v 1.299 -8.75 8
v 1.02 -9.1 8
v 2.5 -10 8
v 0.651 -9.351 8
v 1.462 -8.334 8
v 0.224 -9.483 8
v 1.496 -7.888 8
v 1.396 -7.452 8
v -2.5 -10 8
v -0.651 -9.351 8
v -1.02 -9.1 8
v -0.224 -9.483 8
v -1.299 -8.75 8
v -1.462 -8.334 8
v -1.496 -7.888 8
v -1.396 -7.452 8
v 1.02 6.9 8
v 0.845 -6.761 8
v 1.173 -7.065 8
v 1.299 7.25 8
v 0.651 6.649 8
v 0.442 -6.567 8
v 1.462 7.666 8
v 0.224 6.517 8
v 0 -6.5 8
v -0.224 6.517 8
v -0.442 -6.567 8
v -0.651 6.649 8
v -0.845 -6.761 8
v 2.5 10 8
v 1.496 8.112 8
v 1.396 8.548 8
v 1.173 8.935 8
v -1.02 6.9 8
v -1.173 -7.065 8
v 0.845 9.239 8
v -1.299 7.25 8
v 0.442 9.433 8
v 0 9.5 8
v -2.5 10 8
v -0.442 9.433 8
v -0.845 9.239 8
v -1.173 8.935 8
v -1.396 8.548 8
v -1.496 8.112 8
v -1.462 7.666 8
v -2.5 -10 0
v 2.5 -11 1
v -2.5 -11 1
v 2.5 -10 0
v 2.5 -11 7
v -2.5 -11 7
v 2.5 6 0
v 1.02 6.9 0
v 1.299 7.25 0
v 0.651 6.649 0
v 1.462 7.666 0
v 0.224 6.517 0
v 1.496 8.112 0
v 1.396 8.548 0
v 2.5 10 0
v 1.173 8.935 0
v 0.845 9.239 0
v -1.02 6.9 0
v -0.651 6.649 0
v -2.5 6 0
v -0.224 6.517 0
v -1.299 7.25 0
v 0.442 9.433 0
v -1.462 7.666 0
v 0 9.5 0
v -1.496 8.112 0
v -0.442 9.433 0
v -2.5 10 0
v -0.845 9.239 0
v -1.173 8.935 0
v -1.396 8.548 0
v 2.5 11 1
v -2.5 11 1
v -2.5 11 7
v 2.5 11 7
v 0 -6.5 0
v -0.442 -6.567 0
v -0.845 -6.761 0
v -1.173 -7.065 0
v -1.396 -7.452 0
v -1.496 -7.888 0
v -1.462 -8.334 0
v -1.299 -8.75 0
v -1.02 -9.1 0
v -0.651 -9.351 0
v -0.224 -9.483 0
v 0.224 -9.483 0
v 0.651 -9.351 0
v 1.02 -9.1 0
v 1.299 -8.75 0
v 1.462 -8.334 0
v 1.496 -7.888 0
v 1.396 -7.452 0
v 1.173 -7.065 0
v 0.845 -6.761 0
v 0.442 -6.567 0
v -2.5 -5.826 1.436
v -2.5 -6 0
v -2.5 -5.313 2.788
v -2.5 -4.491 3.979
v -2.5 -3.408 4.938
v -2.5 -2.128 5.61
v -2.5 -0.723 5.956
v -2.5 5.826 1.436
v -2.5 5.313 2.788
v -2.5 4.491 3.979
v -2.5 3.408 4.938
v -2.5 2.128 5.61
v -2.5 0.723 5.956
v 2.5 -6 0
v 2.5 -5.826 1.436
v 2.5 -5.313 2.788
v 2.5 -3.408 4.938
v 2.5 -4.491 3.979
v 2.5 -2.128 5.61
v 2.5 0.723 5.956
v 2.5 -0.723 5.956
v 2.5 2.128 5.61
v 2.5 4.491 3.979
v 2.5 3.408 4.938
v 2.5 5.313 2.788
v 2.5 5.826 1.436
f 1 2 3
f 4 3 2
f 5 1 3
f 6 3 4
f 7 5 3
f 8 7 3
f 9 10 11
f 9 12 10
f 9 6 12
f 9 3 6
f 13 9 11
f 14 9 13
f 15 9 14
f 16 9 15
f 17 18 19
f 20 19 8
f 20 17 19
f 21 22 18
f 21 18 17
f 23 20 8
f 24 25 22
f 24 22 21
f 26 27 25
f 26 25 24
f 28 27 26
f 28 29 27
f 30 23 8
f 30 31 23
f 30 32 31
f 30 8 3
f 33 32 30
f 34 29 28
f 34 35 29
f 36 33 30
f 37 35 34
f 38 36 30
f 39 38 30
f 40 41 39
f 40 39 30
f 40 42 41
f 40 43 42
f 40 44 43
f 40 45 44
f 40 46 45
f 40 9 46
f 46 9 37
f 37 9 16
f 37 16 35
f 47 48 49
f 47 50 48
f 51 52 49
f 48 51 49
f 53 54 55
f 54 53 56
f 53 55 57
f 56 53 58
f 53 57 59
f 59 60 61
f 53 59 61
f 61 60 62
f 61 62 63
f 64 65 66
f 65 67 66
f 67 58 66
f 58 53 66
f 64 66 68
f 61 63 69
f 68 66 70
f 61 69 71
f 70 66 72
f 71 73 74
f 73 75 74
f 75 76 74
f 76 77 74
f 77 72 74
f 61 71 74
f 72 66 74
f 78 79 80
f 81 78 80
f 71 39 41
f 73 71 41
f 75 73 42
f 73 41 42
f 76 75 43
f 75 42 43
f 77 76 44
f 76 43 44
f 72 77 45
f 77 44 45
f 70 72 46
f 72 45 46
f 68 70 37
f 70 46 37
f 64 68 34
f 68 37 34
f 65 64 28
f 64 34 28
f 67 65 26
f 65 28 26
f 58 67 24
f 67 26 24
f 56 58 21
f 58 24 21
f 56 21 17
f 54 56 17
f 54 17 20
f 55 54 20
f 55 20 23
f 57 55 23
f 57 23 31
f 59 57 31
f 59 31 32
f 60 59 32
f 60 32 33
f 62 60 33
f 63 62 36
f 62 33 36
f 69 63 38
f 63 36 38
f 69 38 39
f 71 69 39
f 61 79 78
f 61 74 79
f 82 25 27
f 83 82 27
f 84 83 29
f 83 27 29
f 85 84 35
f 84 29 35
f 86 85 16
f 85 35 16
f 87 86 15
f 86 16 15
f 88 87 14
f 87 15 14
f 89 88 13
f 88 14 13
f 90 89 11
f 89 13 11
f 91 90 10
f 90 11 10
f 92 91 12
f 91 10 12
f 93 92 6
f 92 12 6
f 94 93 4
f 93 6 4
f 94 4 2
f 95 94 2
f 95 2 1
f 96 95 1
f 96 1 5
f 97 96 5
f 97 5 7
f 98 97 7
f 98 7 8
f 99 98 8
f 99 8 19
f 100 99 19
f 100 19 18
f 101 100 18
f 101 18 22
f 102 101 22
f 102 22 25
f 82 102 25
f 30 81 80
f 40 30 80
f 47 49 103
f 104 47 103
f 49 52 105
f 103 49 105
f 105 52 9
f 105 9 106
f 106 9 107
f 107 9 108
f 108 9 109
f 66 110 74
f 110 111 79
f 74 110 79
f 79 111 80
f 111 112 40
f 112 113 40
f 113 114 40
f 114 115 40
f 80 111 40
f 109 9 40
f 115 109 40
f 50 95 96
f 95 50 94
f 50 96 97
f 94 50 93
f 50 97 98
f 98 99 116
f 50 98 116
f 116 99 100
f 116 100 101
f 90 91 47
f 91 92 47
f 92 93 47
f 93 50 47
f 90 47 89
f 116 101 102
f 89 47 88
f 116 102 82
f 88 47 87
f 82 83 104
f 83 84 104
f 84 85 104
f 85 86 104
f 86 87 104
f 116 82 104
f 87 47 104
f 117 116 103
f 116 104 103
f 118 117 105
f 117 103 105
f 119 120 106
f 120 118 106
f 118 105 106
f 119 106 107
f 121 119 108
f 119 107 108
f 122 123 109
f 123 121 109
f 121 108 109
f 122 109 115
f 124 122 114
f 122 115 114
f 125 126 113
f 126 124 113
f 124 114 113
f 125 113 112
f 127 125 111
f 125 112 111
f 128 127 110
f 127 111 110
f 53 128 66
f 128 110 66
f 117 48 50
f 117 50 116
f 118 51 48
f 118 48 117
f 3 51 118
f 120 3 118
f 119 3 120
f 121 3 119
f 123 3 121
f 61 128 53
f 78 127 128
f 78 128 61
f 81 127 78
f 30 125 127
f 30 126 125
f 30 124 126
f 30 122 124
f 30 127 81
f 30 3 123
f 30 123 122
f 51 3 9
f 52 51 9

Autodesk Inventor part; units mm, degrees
ref_plane "YZ Plane" through (0, 0, 0) normal (1, 0, 0) x (0, 1, 0)
ref_plane "XY Plane" through (0, 0, 0) normal (0, 0, 1) x (1, 0, 0)
sketch "Skizze1" plane through (0, 0, 0) normal (1, 0, 0) x (0, 1, 0)
  line L0 (-11, 0) -> (-6, 0)
  arc A0 (6, 0) -> (-6, 0) centre (0, 0) ccw
  line L1 (6, 0) -> (11, 0)
  line L2 (11, 0) -> (11, 8)
  line L3 (-11, 8) -> (-11, 0)
  line L4 (-11, 8) -> (11, 8)
  point P0 (0, 0)
  dimension "d2" = 6
  dimension "d18" = 22
  dimension "d26" = 8
extrude "Extrusion1" add sketch "Skizze1" along normal mid plane 5
ref_plane "Arbeitsebene2" through (0, 0, 0) normal (1, 0, 0) x (0, 0, -1)
sketch "Skizze5" plane through (2.5, -6, 0) normal (0, 0, -1) x (-1, 0, 0)
  line L0 (2.5, 6) -> (-2.4006, 6) construction
  line L1 (0, -5) -> (0, 0) projected
  point P0 (2.5, -2)
  point P1 (2.5, 14)
  dimension "d27" = 16
  dimension "d28" = 2.5
hole "Bohrung2" at (0, -8, 0) at (0, 8, 0) direction (0, 0, 1) diameter 3 end through all
chamfer "Fase1" distance 1 angle 45 4 edges at (0, -11, 8) (0, 11, 8) (0, 11, 0) (0, -11, 0)
properties part number "Halterung_Motor" material "ABS-Kunststoff"
